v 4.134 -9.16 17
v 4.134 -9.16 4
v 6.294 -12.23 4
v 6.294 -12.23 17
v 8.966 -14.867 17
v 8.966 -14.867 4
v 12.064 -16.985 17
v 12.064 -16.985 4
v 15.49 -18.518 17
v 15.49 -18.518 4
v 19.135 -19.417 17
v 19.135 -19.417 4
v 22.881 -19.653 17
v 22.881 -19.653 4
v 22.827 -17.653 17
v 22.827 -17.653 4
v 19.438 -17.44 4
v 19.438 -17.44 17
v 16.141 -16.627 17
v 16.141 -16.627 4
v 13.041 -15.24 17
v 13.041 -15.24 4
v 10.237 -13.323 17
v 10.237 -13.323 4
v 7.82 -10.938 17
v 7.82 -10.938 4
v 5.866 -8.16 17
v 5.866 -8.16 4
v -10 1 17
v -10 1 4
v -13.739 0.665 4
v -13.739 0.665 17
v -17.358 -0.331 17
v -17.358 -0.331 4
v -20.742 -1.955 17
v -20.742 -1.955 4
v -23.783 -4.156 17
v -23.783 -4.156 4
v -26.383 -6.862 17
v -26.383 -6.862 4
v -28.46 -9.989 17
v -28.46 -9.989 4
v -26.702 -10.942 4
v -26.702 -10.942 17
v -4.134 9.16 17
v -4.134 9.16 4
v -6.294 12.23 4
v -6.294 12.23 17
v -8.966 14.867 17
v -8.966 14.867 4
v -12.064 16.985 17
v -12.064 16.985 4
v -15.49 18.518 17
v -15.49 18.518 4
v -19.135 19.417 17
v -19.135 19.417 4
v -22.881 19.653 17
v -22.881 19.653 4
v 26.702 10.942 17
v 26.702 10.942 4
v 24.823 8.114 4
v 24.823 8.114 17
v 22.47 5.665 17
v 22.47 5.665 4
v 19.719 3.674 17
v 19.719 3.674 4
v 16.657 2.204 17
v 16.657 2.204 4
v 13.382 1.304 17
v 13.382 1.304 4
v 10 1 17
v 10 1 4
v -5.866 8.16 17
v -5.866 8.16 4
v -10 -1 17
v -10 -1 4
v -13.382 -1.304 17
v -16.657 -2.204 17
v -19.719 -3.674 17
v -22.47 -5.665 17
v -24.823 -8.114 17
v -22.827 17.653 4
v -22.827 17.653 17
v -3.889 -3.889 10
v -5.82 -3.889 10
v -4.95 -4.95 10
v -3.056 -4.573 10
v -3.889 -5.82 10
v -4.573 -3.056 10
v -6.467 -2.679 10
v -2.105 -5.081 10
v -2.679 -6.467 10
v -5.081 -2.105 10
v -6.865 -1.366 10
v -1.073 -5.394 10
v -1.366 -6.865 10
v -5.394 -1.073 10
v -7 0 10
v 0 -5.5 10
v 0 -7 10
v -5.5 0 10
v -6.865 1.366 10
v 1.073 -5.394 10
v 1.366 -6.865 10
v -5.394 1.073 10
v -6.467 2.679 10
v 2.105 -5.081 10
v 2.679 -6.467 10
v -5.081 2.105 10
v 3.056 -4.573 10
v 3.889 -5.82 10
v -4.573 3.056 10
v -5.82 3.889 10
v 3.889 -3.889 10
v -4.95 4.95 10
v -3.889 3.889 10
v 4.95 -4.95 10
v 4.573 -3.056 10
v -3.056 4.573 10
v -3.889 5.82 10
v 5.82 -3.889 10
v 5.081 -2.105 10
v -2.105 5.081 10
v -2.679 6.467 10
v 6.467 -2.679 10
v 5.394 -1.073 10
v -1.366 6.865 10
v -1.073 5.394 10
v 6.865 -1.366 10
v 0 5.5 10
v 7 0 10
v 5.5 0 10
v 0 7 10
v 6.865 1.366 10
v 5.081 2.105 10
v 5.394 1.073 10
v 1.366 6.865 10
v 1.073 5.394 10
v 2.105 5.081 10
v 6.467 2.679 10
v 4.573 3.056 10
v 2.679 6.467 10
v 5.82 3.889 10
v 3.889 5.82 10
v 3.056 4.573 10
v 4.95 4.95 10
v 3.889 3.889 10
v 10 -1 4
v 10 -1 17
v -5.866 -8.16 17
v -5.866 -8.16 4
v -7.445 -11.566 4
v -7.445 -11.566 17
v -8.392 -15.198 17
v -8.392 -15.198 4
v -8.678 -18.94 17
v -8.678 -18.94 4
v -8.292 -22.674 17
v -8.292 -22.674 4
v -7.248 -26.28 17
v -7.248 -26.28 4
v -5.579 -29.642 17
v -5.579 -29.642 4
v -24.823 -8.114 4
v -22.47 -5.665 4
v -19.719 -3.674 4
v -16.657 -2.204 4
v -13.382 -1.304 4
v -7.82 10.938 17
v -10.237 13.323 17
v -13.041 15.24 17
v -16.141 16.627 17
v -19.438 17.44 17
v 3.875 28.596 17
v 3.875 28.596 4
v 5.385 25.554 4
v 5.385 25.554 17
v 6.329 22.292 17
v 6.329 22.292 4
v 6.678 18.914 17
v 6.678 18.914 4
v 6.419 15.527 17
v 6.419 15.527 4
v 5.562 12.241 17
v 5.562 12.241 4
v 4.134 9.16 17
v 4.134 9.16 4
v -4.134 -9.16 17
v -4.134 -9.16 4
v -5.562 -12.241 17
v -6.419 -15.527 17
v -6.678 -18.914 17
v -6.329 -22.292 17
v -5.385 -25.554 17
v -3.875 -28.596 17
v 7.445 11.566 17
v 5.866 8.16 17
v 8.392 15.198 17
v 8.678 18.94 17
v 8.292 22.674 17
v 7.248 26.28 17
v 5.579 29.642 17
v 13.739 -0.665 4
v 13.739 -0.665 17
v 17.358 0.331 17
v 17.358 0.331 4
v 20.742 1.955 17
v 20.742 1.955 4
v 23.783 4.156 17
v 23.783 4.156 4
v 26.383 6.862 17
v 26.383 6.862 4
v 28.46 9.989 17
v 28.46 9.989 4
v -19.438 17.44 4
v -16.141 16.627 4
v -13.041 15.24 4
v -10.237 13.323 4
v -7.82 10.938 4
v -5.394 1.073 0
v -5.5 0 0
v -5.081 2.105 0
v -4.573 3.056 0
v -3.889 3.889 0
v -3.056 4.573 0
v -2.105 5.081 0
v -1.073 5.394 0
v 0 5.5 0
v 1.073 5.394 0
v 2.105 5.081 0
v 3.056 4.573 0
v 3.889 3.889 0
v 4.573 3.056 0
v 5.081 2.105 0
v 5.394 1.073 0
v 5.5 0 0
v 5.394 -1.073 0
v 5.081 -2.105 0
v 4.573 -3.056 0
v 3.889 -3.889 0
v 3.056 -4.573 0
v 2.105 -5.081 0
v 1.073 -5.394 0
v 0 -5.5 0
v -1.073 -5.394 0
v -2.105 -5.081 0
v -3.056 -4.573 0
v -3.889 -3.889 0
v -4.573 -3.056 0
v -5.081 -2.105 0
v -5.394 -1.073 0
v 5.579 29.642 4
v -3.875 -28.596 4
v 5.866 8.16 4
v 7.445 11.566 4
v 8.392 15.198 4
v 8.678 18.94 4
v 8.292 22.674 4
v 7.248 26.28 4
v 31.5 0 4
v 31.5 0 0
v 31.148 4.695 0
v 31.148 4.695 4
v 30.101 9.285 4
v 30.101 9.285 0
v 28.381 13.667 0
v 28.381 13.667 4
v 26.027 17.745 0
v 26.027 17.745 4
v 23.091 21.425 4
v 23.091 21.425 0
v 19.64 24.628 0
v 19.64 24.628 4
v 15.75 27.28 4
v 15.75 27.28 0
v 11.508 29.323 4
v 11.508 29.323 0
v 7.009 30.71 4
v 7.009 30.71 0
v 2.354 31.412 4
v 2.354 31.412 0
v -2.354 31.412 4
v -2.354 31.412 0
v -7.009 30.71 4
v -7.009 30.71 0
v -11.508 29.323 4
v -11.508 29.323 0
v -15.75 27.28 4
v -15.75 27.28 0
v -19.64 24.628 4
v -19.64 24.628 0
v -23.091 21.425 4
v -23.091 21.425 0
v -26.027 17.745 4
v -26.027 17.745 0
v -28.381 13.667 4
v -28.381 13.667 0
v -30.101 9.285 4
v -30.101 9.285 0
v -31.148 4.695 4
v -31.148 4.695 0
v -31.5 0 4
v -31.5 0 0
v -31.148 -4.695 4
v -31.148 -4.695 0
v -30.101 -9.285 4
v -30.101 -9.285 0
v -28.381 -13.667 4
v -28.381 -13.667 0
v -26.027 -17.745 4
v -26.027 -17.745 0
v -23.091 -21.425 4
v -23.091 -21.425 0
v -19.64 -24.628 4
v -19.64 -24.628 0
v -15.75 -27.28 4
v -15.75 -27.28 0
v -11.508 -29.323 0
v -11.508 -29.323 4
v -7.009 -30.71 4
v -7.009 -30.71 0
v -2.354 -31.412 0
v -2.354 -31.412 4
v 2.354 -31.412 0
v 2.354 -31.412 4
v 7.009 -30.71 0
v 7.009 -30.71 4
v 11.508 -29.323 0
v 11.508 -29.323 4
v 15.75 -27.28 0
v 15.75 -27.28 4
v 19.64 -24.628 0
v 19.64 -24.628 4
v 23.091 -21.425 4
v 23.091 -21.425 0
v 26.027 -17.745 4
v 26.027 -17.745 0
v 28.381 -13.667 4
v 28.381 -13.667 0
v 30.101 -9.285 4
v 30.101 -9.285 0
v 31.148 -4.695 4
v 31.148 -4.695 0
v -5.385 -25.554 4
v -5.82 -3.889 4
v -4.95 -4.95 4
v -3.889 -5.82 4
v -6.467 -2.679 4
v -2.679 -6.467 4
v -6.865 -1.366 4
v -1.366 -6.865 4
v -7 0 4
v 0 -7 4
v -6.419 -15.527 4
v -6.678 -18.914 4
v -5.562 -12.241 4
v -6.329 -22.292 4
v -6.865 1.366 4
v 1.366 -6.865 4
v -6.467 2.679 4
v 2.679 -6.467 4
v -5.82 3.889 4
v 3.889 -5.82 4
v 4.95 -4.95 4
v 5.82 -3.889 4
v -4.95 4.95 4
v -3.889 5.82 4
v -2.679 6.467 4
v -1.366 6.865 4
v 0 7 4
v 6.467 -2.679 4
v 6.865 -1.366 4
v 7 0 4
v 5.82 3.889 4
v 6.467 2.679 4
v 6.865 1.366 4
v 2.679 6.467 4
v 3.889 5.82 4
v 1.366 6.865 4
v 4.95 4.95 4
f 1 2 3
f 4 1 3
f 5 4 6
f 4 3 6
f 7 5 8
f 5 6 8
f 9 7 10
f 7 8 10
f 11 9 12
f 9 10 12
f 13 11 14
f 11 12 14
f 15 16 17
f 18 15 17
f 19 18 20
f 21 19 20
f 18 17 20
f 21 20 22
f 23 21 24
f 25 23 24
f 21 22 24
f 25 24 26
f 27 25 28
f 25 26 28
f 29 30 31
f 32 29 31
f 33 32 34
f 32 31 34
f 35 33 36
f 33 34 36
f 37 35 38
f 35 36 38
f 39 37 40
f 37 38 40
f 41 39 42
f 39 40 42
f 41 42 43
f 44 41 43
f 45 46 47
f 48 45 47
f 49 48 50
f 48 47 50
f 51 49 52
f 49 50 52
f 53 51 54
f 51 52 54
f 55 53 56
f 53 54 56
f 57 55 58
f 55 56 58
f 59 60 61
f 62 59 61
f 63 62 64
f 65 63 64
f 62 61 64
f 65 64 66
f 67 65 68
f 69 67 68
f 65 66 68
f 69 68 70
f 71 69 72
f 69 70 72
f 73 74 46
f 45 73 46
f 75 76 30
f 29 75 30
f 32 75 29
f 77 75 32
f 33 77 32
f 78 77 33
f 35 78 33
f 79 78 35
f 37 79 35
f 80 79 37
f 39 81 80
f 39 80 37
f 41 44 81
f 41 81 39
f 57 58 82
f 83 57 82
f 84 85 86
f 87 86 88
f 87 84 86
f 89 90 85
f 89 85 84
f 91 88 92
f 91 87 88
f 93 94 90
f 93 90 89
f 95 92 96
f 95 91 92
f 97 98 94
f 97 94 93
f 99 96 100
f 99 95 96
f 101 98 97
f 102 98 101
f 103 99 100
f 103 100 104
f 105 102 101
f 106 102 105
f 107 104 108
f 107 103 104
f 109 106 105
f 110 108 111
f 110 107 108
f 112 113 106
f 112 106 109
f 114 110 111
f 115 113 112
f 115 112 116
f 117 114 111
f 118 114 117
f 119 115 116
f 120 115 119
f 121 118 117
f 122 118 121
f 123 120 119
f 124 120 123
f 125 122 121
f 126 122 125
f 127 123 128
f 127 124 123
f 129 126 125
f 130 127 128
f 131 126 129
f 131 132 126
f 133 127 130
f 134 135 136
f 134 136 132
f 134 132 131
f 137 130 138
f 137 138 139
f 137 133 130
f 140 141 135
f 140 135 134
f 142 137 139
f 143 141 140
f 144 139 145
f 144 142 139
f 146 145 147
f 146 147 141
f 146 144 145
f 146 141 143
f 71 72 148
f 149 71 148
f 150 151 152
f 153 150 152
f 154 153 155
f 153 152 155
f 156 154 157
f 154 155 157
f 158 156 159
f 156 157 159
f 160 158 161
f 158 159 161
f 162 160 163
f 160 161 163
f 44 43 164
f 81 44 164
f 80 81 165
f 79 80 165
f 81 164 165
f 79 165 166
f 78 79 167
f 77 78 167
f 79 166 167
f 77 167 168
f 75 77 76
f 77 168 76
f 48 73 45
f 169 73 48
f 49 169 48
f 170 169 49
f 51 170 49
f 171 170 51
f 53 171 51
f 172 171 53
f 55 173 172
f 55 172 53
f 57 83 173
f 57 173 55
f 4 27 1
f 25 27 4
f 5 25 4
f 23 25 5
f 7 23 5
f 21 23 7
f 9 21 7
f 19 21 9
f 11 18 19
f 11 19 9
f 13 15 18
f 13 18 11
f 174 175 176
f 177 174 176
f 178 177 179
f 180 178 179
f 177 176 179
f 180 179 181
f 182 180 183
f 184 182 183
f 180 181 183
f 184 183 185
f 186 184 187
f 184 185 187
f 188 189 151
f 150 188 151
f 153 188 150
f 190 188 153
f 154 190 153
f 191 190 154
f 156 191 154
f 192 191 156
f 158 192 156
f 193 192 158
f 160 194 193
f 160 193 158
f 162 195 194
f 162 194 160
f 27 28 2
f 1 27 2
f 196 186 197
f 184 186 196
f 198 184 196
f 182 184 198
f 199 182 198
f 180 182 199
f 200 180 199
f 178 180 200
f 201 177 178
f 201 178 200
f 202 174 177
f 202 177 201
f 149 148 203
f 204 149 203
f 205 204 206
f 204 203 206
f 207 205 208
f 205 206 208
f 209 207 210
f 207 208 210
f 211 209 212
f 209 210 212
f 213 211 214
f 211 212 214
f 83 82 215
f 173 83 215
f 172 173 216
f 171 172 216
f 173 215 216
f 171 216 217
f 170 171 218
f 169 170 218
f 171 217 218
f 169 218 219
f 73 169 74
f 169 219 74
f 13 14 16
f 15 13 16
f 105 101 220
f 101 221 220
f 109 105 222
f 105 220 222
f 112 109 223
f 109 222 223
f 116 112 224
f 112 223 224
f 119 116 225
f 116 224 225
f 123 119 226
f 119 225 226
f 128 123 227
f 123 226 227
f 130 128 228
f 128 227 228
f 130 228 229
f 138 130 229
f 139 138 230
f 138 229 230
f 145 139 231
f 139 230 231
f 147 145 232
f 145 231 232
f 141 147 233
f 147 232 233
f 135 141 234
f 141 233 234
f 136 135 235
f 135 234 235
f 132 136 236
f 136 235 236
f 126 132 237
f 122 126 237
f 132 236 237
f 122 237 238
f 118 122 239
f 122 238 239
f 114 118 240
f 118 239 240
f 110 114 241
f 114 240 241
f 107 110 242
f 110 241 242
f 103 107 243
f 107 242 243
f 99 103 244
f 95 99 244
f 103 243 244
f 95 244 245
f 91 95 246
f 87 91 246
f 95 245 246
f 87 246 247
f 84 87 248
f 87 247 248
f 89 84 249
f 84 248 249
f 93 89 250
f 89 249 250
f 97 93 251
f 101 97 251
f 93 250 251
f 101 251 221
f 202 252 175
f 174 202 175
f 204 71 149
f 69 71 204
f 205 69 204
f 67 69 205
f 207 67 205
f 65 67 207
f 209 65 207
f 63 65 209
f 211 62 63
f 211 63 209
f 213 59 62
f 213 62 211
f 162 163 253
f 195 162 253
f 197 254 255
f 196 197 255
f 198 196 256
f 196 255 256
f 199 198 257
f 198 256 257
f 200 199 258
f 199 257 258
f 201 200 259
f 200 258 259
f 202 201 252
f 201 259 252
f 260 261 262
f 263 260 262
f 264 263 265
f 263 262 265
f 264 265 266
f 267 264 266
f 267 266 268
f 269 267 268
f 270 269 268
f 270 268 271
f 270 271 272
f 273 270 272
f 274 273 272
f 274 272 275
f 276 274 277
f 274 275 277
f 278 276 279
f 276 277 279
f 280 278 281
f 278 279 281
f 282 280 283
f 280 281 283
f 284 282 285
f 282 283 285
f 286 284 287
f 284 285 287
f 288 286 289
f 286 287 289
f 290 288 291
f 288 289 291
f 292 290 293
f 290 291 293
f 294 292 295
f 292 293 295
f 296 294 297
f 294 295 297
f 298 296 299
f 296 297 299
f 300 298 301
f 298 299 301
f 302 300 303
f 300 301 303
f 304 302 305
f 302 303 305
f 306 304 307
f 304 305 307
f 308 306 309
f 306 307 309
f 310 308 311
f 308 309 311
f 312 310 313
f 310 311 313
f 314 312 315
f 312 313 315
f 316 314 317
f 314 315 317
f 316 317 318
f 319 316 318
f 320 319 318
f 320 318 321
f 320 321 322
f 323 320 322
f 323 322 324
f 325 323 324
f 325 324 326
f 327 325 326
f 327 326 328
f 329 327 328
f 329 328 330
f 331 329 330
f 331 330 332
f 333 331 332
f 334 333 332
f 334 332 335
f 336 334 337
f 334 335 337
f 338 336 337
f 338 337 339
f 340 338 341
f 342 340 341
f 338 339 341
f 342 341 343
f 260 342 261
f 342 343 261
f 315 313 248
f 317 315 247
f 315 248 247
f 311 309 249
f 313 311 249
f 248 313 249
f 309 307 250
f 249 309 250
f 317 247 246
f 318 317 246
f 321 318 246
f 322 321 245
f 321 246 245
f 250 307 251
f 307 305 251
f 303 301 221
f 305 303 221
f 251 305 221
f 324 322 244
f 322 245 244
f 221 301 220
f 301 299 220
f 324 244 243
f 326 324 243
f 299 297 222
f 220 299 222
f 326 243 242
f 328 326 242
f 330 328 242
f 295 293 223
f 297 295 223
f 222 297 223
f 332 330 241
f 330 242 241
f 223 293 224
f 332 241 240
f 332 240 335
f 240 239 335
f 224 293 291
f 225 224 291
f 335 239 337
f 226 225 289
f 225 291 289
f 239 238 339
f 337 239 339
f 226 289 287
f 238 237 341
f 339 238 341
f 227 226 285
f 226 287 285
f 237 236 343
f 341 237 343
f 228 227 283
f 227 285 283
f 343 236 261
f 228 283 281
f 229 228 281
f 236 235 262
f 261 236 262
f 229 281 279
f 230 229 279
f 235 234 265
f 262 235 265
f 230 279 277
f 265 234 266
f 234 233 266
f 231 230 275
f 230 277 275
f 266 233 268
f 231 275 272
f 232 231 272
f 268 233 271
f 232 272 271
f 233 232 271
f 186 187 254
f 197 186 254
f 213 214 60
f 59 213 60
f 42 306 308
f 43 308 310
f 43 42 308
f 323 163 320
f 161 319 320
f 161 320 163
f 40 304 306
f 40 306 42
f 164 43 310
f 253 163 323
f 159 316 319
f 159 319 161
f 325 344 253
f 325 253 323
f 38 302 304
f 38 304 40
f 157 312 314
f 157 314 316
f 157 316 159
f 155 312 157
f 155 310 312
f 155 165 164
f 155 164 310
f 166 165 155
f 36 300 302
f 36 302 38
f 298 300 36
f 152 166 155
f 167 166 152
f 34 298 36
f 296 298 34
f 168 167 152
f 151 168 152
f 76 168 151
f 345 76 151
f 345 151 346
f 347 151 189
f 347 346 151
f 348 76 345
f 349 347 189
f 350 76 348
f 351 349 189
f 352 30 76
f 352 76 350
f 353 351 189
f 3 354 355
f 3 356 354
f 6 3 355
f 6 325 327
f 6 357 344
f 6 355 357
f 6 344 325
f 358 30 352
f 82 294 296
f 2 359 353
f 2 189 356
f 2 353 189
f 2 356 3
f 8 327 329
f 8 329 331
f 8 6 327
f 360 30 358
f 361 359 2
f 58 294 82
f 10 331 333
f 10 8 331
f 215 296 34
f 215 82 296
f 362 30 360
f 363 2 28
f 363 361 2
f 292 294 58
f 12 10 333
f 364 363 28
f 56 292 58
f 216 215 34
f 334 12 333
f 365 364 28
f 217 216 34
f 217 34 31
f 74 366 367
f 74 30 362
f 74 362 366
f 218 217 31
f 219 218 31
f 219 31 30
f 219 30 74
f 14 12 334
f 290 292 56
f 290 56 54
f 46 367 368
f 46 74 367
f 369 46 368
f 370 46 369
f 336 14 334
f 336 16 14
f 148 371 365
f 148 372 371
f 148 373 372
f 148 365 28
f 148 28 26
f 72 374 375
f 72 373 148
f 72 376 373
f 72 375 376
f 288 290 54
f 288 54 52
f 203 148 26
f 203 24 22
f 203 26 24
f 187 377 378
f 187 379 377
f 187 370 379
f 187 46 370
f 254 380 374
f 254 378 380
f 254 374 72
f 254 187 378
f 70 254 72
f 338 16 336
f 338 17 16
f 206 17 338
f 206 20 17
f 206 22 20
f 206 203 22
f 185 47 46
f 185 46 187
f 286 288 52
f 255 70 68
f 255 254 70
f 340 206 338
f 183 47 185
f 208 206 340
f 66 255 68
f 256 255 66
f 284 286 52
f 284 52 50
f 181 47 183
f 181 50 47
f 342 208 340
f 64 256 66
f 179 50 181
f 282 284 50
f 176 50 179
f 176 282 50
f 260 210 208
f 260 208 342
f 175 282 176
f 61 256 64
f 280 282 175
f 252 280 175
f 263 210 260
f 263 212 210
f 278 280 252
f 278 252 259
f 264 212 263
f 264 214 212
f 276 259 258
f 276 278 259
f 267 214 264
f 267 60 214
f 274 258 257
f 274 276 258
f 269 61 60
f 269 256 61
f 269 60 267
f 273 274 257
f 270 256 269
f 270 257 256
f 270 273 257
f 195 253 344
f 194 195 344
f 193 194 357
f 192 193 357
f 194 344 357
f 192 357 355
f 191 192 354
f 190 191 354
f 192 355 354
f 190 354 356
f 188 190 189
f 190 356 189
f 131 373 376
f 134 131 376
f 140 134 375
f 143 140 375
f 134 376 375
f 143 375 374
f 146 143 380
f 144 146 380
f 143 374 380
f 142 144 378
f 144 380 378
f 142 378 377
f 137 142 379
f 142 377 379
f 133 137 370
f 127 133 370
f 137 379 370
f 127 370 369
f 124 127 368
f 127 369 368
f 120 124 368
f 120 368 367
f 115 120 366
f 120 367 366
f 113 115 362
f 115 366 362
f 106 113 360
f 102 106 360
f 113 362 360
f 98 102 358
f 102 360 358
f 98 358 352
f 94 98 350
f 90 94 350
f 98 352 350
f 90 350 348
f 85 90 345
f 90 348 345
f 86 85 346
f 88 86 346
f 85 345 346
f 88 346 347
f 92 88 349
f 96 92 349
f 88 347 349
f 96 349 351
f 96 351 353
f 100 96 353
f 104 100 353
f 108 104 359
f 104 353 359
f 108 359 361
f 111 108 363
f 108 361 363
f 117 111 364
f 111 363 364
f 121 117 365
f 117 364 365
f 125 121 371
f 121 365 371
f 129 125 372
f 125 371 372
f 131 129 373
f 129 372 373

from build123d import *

# Parameters (mm, degrees)
SKETCH1_R                     = 31.5
EXTRUDE1_DEPTH                = 4
EXTRUDE_THIN1_DEPTH           = 13
CIRPATTERN7_COUNT             = 6
SKETCH3_R                     = 7
EXTRUDE2_DEPTH                = 6
M11_0_11_DIAMETER_HOLE1_D     = 11
M11_0_11_DIAMETER_HOLE1_DEPTH = 10
M11_0_11_DIAMETER_HOLE1_TIP   = 3.304733405


with BuildPart() as part:
    # Sketch1 → Extrude1 (new body)
    with BuildSketch(Plane.XY):
        Circle(SKETCH1_R)
    extrude(amount=EXTRUDE1_DEPTH)

    # Sketch2 → Extrude-Thin1 (add)
    with BuildSketch(Plane.XY.offset(4)):
        with BuildLine():
            ThreePointArc((10, -1), (20.741698661, 1.955169442), (28.460203071, 9.988960964))
            Line((28.460203071, 9.988960964), (26.702088493, 10.942393254))
            ThreePointArc((26.702088493, 10.942393254), (19.718679741, 3.673724733), (10, 1))
            Line((10, 1), (10, -1))
        make_face()
    extrude_thin1 = extrude(amount=EXTRUDE_THIN1_DEPTH)

    # CirPattern7: Extrude-Thin1 ×6 about axis
    cirpattern7_axis = Axis((0, 0, 0), (0, 0, 1))
    for i in range(1, CIRPATTERN7_COUNT):
        add(extrude_thin1.rotate(cirpattern7_axis, i * 360 / CIRPATTERN7_COUNT))

    # Sketch3 → Extrude2 (add)
    with BuildSketch(Plane.XY.offset(4)):
        Circle(SKETCH3_R)
    extrude(amount=EXTRUDE2_DEPTH)

    # M11.0 _11_ Diameter Hole1
    with Locations(Plane.XY.offset(10)):
        with Locations((0, 0)):
            Hole(M11_0_11_DIAMETER_HOLE1_D / 2, depth=M11_0_11_DIAMETER_HOLE1_DEPTH)
            with Locations((0, 0, -(M11_0_11_DIAMETER_HOLE1_DEPTH + M11_0_11_DIAMETER_HOLE1_TIP / 2))):  # 118° drill point
                Cone(0, M11_0_11_DIAMETER_HOLE1_D / 2, M11_0_11_DIAMETER_HOLE1_TIP, mode=Mode.SUBTRACT)


solid = part.part
